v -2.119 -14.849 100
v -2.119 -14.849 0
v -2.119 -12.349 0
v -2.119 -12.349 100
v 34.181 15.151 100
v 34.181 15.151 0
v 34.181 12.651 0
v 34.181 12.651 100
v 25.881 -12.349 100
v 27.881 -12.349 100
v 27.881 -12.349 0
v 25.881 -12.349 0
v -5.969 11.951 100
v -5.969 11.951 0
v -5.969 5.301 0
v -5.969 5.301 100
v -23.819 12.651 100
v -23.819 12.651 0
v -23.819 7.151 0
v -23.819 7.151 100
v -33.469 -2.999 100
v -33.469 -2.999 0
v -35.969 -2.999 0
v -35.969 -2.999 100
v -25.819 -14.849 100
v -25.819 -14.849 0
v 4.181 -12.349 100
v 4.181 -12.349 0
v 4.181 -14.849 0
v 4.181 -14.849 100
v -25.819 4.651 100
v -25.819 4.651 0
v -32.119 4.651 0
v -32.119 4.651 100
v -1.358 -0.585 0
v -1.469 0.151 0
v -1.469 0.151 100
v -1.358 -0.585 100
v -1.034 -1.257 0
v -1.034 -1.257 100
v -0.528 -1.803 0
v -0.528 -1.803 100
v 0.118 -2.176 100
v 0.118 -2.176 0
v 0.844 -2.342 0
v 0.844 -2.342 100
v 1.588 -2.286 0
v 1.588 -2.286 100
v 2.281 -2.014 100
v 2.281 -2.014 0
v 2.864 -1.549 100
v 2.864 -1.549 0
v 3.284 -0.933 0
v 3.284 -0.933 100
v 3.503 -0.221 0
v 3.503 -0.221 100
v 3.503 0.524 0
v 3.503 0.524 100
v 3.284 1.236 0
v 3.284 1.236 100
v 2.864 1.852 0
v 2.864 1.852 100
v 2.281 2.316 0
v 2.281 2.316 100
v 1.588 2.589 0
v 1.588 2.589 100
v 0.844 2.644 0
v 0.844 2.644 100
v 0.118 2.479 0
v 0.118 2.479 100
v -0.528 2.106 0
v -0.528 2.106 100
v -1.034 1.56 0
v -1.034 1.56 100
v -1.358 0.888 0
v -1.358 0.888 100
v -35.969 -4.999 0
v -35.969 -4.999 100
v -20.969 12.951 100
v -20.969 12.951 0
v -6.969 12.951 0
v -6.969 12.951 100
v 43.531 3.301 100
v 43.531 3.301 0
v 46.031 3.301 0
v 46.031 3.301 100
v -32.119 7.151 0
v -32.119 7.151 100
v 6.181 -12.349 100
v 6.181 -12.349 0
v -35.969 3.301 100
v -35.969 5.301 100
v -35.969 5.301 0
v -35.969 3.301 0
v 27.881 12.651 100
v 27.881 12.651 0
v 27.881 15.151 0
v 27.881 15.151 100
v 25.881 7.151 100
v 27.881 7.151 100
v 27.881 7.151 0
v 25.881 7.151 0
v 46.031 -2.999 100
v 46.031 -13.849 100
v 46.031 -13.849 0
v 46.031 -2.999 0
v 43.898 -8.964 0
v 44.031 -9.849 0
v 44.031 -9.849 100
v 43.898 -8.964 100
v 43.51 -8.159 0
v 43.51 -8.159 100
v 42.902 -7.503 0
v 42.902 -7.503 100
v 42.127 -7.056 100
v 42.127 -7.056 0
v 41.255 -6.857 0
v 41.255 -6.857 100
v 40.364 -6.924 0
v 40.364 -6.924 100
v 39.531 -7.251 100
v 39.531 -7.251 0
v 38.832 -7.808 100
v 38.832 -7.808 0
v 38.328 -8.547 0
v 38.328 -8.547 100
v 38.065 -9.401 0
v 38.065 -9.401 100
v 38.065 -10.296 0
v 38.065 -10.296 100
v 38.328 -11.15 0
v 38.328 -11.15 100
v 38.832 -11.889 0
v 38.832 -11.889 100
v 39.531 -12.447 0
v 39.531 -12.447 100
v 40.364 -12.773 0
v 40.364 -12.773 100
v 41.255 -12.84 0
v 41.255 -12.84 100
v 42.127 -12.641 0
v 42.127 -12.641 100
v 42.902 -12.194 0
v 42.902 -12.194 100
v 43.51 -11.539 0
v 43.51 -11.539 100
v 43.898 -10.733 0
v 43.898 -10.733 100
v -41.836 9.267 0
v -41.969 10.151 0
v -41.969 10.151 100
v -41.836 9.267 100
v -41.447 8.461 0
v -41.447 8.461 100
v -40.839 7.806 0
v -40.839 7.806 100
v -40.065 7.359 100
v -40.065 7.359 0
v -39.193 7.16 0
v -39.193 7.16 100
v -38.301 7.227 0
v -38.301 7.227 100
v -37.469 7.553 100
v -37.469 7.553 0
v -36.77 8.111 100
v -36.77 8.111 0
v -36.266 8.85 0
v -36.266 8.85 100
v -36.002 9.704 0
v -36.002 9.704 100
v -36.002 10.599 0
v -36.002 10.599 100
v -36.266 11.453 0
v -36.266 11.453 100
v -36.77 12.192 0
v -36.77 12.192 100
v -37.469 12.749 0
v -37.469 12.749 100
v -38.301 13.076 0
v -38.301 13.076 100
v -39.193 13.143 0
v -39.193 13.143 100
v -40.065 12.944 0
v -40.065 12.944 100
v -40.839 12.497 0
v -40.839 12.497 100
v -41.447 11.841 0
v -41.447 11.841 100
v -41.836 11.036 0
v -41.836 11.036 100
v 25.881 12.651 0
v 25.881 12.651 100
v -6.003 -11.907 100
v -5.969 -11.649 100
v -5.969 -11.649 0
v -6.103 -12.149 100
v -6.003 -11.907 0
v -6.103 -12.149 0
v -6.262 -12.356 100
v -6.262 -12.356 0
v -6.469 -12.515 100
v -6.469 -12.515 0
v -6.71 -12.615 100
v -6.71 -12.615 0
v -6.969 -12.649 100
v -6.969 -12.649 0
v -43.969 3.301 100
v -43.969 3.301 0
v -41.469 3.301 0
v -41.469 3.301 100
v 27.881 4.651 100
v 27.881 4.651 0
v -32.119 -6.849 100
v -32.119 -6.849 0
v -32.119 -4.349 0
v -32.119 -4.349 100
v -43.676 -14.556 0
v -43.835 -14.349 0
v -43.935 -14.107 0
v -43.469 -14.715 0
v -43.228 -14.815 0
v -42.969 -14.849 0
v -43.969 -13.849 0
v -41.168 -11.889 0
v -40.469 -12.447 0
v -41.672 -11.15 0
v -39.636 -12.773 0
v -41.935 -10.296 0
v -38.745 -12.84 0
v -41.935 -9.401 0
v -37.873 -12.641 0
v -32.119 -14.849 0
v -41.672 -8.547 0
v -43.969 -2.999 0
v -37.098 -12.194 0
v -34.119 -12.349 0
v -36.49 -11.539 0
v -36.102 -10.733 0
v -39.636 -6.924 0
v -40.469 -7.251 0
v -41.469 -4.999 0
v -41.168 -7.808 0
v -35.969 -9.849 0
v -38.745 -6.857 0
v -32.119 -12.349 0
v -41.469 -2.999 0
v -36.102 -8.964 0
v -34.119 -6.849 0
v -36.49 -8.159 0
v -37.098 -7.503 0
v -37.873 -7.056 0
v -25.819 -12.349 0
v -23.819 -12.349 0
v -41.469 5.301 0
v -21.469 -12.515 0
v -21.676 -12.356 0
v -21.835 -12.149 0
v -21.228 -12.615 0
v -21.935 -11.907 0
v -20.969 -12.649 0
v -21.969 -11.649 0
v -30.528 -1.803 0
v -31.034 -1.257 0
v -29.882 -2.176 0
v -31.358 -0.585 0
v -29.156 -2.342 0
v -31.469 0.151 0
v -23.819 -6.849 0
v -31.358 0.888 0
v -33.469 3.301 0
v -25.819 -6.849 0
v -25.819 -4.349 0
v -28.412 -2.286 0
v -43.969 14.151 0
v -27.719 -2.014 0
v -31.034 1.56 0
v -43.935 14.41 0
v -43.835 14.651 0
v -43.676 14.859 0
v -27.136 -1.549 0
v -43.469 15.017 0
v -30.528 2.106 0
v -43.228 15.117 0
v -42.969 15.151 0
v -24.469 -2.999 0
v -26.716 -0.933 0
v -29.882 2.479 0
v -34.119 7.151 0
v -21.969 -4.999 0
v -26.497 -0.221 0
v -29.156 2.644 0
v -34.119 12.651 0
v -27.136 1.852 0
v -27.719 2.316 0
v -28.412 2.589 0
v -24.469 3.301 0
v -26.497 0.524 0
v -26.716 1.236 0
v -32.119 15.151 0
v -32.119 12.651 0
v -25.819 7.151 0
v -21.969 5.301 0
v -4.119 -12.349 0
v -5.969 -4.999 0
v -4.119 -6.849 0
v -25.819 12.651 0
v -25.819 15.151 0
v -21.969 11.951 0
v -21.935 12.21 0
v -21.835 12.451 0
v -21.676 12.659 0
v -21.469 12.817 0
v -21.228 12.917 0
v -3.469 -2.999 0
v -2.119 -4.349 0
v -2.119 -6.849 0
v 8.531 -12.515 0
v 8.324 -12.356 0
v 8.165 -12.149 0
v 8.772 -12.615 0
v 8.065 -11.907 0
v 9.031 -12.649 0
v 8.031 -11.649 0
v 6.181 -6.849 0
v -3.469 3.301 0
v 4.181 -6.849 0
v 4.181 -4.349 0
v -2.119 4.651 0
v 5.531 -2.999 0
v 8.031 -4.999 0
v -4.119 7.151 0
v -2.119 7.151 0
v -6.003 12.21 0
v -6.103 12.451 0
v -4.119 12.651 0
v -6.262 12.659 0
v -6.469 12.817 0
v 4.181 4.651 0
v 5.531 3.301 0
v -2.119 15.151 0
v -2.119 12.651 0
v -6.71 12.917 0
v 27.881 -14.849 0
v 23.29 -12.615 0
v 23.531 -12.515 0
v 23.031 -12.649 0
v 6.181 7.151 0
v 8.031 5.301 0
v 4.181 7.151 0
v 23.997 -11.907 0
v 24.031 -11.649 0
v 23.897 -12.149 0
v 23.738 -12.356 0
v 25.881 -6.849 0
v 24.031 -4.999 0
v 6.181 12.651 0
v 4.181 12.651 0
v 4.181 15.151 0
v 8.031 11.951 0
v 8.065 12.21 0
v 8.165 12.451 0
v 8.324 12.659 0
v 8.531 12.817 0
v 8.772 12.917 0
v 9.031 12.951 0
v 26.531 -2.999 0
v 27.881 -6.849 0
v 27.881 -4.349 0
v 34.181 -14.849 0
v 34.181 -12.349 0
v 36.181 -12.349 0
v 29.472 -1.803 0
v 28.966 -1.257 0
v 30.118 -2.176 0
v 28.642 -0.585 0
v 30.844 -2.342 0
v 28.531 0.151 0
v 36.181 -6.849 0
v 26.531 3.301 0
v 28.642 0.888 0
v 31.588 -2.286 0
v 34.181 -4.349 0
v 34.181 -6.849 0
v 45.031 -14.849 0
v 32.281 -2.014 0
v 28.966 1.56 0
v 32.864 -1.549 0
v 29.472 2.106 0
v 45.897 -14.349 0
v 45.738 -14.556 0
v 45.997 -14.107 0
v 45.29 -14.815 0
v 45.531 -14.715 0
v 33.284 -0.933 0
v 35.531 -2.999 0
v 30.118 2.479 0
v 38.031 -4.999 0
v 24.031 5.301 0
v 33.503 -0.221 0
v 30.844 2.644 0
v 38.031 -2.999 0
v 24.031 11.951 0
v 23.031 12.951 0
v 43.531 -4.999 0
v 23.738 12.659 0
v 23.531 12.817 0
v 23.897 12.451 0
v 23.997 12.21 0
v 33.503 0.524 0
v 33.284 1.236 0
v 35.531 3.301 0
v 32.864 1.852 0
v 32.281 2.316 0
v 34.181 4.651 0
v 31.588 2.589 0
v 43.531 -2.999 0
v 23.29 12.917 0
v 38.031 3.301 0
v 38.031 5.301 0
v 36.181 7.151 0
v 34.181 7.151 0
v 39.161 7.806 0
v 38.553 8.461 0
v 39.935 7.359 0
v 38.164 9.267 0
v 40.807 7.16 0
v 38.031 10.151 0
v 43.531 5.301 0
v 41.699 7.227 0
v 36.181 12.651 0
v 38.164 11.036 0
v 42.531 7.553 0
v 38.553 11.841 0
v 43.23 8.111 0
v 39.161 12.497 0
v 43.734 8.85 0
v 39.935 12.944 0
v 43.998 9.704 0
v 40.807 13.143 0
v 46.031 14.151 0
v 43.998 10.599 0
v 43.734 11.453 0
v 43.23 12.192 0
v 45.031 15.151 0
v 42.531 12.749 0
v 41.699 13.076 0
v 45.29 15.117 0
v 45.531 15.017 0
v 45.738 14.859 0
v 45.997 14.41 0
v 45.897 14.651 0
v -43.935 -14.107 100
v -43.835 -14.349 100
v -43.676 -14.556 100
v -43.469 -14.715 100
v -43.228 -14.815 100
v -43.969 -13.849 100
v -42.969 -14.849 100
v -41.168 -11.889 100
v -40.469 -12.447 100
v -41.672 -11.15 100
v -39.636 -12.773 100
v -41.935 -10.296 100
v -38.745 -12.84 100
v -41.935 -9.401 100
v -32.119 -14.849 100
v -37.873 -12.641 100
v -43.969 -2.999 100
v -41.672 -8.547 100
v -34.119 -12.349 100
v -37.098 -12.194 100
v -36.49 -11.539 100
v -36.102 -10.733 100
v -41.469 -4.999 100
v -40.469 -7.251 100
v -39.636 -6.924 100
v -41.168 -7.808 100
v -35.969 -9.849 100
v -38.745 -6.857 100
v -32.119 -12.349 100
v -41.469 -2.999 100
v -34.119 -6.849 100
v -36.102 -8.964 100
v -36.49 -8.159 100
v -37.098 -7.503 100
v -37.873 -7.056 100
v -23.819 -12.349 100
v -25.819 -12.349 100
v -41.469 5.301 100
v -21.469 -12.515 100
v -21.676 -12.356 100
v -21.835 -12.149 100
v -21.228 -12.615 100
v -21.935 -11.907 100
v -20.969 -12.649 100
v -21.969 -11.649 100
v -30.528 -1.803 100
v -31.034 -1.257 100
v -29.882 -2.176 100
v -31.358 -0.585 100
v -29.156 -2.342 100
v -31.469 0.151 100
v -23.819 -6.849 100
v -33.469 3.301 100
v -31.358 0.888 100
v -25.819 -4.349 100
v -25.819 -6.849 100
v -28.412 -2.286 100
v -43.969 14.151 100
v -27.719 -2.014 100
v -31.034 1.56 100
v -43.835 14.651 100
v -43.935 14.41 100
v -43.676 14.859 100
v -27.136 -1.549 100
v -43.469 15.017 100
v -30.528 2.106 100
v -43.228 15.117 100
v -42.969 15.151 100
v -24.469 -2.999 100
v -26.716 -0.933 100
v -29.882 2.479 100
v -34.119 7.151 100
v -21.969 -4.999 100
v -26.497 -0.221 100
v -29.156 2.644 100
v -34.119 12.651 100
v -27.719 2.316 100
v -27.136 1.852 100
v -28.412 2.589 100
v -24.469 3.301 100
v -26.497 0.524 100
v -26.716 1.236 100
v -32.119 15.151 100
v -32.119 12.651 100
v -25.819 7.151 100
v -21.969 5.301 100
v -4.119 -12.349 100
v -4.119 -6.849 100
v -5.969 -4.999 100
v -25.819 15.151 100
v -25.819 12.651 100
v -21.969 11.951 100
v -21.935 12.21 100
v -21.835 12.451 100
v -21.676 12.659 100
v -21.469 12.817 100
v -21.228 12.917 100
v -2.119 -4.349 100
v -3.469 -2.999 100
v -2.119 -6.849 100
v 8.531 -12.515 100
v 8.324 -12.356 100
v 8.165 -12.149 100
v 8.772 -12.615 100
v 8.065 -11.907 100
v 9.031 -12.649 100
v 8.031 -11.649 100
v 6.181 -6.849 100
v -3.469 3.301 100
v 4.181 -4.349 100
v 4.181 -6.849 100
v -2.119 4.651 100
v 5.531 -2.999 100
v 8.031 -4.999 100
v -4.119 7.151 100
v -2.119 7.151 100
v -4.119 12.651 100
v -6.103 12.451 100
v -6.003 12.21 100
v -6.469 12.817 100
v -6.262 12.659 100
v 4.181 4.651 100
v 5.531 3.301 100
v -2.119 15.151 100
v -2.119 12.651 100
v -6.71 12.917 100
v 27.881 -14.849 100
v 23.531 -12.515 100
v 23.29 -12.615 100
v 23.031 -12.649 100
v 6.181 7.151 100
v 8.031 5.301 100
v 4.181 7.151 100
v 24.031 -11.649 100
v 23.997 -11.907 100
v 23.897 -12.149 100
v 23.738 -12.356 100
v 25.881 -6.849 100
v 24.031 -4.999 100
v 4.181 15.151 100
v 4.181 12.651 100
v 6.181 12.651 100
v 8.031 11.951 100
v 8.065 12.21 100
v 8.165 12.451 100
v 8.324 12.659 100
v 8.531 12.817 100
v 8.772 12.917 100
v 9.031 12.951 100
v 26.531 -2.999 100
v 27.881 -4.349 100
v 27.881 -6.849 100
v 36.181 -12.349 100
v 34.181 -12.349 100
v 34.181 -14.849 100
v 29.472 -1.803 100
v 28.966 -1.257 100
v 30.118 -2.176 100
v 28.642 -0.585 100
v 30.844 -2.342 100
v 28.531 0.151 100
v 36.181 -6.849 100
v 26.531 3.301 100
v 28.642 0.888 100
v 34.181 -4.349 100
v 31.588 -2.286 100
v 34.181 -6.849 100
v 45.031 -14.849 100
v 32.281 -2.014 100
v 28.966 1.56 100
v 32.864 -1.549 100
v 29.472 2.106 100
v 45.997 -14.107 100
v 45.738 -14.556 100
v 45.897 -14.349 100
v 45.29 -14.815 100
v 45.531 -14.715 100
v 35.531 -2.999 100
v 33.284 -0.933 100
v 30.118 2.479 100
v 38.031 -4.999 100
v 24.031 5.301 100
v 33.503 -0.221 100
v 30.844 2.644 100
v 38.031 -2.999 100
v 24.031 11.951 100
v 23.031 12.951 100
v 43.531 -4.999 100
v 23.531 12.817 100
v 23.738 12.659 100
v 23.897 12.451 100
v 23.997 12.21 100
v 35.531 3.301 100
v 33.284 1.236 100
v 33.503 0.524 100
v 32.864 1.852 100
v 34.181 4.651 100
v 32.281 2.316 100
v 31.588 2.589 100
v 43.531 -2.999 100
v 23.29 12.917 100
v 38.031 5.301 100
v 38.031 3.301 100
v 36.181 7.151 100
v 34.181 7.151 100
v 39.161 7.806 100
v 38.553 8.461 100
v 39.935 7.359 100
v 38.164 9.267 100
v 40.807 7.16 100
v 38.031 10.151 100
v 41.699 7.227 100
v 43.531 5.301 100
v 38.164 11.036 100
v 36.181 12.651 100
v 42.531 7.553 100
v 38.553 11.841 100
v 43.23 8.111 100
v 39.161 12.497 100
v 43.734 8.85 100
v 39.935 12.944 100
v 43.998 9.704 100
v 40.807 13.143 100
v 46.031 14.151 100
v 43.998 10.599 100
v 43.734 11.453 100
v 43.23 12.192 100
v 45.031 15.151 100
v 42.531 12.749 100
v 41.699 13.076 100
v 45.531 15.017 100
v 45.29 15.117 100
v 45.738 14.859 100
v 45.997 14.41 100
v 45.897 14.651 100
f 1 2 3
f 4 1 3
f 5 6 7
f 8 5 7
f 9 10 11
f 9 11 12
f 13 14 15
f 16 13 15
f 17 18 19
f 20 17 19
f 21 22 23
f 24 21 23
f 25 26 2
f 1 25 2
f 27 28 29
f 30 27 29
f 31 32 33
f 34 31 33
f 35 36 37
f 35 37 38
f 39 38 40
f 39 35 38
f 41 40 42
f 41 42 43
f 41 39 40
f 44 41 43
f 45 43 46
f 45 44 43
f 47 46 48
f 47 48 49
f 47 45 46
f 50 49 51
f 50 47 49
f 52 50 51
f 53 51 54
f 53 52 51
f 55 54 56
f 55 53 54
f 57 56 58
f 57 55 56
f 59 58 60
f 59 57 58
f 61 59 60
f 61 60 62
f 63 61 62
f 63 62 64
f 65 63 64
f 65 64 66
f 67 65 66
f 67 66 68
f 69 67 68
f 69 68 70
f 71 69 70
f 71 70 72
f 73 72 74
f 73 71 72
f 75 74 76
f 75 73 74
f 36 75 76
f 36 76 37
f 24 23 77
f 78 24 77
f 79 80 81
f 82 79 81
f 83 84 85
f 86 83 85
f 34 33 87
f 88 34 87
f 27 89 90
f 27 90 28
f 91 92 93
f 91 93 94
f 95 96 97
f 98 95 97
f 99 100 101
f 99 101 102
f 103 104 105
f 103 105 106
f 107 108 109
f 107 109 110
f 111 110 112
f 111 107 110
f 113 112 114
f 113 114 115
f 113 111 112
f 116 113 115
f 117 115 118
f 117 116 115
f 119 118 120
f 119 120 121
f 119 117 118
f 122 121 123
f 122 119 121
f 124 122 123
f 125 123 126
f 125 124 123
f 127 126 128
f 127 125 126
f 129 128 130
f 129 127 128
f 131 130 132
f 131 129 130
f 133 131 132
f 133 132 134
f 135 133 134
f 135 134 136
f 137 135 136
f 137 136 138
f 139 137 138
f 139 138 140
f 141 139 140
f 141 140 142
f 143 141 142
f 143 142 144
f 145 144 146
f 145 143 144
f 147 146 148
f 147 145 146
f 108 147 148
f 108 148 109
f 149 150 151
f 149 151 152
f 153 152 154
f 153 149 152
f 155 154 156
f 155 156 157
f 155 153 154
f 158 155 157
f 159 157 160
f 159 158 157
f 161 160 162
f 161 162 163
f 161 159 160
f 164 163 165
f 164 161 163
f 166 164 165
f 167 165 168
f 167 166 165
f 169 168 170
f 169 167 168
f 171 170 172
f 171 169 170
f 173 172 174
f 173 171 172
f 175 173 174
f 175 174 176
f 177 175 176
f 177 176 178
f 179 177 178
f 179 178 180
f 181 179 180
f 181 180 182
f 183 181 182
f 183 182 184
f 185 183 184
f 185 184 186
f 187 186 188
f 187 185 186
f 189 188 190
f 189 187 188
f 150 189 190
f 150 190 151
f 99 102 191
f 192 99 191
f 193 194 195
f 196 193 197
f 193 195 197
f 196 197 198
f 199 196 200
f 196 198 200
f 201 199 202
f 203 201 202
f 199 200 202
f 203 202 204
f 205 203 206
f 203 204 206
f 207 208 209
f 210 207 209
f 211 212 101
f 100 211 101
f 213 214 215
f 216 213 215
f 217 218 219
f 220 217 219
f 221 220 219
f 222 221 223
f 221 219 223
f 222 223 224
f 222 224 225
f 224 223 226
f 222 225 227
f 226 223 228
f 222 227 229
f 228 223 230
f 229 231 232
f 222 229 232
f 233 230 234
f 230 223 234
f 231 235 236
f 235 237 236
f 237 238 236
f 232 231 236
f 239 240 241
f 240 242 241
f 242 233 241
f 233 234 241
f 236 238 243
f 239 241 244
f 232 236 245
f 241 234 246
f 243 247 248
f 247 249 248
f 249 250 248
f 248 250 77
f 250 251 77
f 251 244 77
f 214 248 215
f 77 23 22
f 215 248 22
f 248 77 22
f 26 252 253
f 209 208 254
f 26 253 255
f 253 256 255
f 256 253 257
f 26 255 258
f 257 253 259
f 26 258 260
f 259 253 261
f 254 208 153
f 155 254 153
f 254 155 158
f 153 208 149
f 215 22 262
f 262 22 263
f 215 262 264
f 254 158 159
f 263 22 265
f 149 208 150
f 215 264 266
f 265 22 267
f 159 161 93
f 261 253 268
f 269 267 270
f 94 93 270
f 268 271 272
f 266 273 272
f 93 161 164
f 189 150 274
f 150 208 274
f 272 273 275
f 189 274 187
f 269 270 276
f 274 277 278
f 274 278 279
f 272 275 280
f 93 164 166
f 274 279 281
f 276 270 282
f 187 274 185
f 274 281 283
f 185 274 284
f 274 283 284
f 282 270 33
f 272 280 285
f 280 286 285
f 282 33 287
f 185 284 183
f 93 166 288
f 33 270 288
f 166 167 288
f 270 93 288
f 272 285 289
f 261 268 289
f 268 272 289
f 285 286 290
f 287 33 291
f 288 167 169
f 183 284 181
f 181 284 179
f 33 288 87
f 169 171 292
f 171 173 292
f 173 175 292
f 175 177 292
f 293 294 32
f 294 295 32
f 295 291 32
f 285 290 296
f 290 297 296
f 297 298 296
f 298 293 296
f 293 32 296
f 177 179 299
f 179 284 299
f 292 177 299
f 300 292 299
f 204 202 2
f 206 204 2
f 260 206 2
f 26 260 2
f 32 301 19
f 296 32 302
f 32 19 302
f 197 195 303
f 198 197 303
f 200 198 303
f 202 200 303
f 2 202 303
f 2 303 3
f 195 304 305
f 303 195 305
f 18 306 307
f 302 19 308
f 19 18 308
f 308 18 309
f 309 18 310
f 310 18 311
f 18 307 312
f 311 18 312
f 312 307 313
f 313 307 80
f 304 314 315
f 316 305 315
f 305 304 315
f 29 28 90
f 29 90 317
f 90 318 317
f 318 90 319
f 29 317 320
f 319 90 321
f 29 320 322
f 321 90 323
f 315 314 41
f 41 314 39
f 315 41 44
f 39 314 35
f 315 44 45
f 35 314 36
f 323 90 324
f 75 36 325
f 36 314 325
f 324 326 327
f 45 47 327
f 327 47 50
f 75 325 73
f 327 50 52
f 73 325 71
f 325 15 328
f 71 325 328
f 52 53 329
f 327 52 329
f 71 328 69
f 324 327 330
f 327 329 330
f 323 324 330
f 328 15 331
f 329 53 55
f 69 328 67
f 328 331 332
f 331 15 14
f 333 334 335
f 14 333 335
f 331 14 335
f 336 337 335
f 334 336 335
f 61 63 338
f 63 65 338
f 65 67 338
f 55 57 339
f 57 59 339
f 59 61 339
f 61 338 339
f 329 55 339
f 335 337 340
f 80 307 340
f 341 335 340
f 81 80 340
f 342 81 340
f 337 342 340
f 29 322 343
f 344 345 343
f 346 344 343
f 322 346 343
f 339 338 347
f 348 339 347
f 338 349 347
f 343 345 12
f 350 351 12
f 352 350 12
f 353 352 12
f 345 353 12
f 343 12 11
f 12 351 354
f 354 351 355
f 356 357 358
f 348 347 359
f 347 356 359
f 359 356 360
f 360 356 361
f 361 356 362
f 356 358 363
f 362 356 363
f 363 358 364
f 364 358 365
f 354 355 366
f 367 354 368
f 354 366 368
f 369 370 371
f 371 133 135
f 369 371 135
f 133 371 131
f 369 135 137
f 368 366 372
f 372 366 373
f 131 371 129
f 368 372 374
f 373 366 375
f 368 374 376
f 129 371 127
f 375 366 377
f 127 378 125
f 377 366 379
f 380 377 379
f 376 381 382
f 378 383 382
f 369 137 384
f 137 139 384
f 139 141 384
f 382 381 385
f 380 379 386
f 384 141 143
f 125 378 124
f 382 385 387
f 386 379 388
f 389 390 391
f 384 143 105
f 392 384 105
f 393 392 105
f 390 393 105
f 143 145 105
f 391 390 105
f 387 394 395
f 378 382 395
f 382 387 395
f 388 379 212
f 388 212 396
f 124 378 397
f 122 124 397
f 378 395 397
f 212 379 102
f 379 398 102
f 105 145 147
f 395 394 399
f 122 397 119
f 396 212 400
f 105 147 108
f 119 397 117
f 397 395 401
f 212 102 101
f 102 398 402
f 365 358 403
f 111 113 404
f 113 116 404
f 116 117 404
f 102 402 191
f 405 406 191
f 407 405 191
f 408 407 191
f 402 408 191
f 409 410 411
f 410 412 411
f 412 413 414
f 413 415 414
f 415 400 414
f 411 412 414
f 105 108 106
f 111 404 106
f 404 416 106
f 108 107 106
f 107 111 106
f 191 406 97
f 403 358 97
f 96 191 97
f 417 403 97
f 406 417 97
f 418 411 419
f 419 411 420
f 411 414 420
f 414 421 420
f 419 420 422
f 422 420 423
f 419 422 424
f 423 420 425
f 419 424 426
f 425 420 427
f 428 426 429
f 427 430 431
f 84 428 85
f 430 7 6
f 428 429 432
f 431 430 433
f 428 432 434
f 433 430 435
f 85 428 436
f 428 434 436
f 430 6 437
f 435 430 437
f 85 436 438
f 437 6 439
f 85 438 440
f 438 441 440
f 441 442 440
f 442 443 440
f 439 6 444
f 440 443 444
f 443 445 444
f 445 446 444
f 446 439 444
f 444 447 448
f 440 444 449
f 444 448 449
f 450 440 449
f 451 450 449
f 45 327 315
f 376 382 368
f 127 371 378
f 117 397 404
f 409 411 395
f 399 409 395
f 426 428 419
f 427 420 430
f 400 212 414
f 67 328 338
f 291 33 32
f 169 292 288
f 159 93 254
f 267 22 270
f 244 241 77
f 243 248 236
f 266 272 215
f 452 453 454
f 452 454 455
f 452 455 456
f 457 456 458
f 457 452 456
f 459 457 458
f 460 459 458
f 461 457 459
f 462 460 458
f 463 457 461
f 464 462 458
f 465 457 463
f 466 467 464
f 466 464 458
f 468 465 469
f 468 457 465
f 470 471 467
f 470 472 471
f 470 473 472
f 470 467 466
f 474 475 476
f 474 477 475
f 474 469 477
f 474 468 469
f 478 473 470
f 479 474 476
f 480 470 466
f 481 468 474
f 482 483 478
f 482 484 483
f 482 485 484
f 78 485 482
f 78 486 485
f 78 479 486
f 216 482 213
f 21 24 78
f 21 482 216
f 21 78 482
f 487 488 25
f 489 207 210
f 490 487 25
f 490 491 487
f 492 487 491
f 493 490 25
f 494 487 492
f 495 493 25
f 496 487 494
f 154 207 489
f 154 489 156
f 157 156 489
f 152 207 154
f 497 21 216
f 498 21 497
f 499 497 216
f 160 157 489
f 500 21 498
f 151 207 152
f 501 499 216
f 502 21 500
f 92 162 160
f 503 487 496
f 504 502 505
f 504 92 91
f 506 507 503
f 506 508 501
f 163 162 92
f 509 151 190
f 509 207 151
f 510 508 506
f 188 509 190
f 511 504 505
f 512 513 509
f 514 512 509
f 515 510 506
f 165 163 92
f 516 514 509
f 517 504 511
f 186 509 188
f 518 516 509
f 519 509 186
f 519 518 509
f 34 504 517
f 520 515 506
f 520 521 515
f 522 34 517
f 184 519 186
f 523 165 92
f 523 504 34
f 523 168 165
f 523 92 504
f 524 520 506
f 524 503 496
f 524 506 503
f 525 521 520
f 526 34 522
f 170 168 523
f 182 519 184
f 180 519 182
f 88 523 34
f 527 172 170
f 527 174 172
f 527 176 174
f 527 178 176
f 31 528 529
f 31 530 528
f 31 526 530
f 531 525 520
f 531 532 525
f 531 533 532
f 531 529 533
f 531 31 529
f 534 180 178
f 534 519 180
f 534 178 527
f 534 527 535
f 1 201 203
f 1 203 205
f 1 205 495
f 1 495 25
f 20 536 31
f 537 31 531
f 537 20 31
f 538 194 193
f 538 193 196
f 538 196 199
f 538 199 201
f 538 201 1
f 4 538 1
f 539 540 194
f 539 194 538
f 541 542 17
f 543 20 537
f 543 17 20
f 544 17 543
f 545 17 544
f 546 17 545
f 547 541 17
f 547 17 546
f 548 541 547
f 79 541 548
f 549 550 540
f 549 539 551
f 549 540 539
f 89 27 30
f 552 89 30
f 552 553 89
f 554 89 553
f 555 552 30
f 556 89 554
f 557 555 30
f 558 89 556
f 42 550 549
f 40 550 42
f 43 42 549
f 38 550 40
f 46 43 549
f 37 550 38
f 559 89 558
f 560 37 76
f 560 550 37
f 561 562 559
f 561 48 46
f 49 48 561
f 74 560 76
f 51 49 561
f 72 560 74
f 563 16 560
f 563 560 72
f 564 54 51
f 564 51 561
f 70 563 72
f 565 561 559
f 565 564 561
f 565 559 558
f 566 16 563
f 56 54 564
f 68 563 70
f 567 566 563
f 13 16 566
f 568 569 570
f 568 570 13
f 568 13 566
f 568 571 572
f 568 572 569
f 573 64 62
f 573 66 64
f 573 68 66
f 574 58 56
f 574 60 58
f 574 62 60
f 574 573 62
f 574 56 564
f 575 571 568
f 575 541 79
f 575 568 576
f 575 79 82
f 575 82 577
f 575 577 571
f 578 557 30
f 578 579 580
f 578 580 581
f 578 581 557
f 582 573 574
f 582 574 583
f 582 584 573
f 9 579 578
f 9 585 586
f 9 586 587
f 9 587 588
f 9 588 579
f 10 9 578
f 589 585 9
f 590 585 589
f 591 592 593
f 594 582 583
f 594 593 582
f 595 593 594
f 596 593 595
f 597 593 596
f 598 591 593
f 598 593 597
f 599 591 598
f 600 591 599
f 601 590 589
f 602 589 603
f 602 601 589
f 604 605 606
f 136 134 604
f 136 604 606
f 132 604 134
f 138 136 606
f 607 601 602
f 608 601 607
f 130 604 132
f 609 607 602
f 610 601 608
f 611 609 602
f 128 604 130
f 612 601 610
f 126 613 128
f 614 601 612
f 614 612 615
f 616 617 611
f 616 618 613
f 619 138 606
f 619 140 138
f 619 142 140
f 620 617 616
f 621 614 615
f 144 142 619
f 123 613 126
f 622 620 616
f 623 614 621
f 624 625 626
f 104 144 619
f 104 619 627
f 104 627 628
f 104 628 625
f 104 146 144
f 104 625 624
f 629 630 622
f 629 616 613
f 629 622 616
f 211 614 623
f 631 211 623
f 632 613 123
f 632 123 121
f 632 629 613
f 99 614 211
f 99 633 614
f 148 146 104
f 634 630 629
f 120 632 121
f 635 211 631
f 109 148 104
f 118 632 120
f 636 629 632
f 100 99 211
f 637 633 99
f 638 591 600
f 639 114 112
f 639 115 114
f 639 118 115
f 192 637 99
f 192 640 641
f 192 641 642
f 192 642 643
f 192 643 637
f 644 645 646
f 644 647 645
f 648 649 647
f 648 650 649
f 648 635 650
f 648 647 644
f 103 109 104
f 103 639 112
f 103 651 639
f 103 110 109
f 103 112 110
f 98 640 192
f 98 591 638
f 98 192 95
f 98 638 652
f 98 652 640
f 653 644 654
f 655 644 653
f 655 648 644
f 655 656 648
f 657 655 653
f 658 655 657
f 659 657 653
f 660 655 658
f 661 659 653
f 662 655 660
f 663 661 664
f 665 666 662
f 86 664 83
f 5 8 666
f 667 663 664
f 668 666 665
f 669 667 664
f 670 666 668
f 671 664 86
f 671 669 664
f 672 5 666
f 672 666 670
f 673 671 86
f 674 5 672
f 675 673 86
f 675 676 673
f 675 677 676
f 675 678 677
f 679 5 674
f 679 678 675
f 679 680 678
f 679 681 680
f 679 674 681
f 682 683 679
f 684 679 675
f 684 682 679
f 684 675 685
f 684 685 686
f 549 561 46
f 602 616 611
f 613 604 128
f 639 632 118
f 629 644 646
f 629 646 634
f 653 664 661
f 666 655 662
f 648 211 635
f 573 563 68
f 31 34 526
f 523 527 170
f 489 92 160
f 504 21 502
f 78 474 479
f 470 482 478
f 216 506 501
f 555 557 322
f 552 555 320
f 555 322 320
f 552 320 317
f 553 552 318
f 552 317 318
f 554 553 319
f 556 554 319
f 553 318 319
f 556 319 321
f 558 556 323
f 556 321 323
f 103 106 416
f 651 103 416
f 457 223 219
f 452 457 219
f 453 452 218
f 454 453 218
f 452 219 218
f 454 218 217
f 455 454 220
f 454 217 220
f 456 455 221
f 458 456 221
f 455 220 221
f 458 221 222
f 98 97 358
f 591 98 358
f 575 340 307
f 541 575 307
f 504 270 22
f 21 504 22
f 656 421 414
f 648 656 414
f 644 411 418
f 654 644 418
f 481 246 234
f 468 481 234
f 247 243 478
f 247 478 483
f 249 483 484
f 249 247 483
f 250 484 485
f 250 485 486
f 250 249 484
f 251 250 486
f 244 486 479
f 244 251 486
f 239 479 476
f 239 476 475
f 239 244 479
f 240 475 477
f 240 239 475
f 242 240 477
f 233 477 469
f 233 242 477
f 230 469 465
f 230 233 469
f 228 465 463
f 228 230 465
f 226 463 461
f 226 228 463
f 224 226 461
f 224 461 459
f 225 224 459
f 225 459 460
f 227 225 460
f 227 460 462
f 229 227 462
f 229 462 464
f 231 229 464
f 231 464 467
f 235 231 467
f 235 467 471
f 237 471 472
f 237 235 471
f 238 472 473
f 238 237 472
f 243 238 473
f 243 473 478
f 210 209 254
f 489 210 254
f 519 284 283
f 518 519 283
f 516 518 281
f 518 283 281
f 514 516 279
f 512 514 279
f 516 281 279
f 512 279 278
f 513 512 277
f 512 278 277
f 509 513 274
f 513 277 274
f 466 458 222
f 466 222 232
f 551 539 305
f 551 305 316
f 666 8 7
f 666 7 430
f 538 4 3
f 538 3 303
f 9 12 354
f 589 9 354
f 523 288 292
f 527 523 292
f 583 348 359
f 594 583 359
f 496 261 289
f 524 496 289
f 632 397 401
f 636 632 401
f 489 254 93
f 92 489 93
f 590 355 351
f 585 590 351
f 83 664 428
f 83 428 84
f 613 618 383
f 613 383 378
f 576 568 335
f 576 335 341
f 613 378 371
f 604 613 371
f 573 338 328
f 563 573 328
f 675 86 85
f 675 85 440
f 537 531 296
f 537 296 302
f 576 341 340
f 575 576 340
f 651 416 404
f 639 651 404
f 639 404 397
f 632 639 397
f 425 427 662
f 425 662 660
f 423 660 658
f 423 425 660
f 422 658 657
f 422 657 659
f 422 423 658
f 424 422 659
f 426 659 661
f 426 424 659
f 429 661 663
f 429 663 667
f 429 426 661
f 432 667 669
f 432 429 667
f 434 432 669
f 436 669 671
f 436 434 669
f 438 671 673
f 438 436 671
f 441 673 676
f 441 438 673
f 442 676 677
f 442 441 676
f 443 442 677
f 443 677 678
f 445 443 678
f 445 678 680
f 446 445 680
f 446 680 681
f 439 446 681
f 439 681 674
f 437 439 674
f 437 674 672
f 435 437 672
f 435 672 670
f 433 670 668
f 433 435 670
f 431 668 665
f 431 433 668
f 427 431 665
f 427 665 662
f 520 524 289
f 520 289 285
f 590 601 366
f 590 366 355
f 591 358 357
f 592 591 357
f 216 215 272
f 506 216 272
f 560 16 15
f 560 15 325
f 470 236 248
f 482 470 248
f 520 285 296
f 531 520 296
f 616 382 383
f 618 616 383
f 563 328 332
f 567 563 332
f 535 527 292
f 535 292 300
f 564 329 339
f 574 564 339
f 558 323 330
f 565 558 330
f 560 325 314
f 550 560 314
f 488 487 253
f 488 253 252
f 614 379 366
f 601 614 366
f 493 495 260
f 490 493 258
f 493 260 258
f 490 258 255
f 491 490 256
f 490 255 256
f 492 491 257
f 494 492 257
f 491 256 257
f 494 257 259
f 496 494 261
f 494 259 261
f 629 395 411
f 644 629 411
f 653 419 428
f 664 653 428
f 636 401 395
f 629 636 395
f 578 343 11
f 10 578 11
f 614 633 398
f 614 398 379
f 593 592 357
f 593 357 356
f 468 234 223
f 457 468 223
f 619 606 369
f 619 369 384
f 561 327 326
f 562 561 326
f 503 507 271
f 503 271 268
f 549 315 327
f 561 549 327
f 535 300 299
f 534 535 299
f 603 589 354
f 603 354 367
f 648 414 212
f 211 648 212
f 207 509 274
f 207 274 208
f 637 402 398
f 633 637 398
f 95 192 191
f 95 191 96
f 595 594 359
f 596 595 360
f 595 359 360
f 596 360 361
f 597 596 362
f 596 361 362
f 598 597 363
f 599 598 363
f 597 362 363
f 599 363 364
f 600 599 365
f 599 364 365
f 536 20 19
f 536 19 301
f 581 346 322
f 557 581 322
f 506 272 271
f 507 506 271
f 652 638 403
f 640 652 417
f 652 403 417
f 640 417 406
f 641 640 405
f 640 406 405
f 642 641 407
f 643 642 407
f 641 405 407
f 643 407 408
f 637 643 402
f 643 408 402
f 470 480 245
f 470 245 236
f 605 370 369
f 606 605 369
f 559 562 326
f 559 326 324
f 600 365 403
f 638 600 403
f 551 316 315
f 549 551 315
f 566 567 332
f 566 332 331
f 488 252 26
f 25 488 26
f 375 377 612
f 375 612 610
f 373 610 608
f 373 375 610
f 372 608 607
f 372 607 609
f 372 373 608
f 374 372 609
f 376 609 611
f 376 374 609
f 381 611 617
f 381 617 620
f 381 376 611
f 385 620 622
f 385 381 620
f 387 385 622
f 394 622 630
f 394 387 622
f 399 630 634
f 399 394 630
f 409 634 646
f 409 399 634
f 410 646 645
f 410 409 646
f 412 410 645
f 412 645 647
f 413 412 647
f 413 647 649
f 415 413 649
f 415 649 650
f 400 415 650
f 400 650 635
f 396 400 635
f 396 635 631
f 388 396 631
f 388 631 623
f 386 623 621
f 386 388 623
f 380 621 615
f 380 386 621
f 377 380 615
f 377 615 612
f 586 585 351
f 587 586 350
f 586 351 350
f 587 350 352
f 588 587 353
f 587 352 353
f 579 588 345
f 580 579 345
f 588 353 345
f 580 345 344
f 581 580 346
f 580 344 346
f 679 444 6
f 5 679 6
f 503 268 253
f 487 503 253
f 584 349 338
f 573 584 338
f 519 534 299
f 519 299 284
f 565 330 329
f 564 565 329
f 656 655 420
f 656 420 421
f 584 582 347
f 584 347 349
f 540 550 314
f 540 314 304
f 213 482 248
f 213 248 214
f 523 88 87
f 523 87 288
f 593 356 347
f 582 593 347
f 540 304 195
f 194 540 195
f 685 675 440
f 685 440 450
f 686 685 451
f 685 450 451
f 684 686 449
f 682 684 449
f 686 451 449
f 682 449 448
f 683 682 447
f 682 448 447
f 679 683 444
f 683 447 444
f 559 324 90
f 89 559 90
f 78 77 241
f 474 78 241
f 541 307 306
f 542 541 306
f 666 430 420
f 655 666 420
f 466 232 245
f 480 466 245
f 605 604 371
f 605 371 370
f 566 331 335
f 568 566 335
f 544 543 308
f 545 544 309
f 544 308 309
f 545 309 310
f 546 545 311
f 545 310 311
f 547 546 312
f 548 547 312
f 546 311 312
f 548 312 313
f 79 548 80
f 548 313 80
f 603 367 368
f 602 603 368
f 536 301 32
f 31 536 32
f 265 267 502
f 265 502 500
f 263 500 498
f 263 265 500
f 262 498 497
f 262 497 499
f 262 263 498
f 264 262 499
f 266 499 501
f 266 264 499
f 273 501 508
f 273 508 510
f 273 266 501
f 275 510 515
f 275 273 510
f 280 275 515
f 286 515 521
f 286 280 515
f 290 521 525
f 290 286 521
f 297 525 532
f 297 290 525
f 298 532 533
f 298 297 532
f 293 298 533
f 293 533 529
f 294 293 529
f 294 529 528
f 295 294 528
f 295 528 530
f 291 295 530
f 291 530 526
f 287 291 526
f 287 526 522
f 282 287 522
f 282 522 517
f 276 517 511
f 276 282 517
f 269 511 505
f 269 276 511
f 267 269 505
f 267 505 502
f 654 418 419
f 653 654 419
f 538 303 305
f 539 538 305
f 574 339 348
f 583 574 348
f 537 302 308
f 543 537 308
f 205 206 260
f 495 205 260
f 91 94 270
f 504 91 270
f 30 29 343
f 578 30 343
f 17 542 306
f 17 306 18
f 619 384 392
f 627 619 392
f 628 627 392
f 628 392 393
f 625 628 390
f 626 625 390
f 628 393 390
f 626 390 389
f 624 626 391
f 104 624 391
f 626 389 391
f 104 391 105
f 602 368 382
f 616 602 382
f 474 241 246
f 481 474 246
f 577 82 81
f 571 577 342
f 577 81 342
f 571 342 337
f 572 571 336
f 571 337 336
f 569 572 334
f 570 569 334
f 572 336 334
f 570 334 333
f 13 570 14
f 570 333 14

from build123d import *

# Parameters (mm, degrees)
EXTRUDE_1_DEPTH = 100


with BuildPart() as part:
    # 草图1 → 凸台-拉伸1 (new body)
    with BuildSketch(Plane.XY):
        with BuildLine():
            Line((-25.818782805, -14.848597483), (-14.968782805, -14.848597483))
            Line((-14.968782805, -14.848597483), (-2.118782805, -14.848597483))
            Line((-2.118782805, -14.848597483), (-2.118782805, -12.348597483))
            Line((-2.118782805, -12.348597483), (-4.118782805, -12.348597483))
            Line((-4.118782805, -12.348597483), (-4.118782805, -6.848597483))
            Line((-4.118782805, -6.848597483), (-2.118782805, -6.848597483))
            Line((-2.118782805, -6.848597483), (-2.118782805, -4.348597483))
            Line((-2.118782805, -4.348597483), (1.031217195, -4.348597483))
            Line((1.031217195, -4.348597483), (4.181217195, -4.348597483))
            Line((4.181217195, -4.348597483), (4.181217195, -6.848597483))
            Line((4.181217195, -6.848597483), (6.181217195, -6.848597483))
            Line((6.181217195, -6.848597483), (6.181217195, -12.348597483))
            Line((6.181217195, -12.348597483), (4.181217195, -12.348597483))
            Line((4.181217195, -12.348597483), (4.181217195, -14.848597483))
            Line((4.181217195, -14.848597483), (17.031217195, -14.848597483))
            Line((17.031217195, -14.848597483), (27.881217195, -14.848597483))
            Line((27.881217195, -14.848597483), (27.881217195, -12.348597483))
            Line((27.881217195, -12.348597483), (25.881217195, -12.348597483))
            Line((25.881217195, -12.348597483), (25.881217195, -6.848597483))
            Line((25.881217195, -6.848597483), (27.881217195, -6.848597483))
            Line((27.881217195, -6.848597483), (27.881217195, -4.348597483))
            Line((27.881217195, -4.348597483), (31.031217195, -4.348597483))
            Line((31.031217195, -4.348597483), (34.181217195, -4.348597483))
            Line((34.181217195, -4.348597483), (34.181217195, -6.848597483))
            Line((34.181217195, -6.848597483), (36.181217195, -6.848597483))
            Line((36.181217195, -6.848597483), (36.181217195, -12.348597483))
            Line((36.181217195, -12.348597483), (34.181217195, -12.348597483))
            Line((34.181217195, -12.348597483), (34.181217195, -14.848597483))
            Line((34.181217195, -14.848597483), (45.031217195, -14.848597483))
            ThreePointArc((45.031217195, -14.848597483), (45.738323976, -14.555704264), (46.031217195, -13.848597483))
            Line((46.031217195, -13.848597483), (46.031217195, -2.998597483))
            Line((46.031217195, -2.998597483), (43.531217195, -2.998597483))
            Line((43.531217195, -2.998597483), (43.531217195, -4.998597483))
            Line((43.531217195, -4.998597483), (38.031217195, -4.998597483))
            Line((38.031217195, -4.998597483), (38.031217195, -2.998597483))
            Line((38.031217195, -2.998597483), (35.531217195, -2.998597483))
            Line((35.531217195, -2.998597483), (35.531217195, 0.151402517))
            Line((35.531217195, 0.151402517), (35.531217195, 3.301402517))
            Line((35.531217195, 3.301402517), (38.031217195, 3.301402517))
            Line((38.031217195, 3.301402517), (38.031217195, 5.301402517))
            Line((38.031217195, 5.301402517), (43.531217195, 5.301402517))
            Line((43.531217195, 5.301402517), (43.531217195, 3.301402517))
            Line((43.531217195, 3.301402517), (46.031217195, 3.301402517))
            Line((46.031217195, 3.301402517), (46.031217195, 14.151402517))
            ThreePointArc((46.031217195, 14.151402517), (45.738323976, 14.858509298), (45.031217195, 15.151402517))
            Line((45.031217195, 15.151402517), (34.181217195, 15.151402517))
            Line((34.181217195, 15.151402517), (34.181217195, 12.651402517))
            Line((34.181217195, 12.651402517), (36.181217195, 12.651402517))
            Line((36.181217195, 12.651402517), (36.181217195, 7.151402517))
            Line((36.181217195, 7.151402517), (34.181217195, 7.151402517))
            Line((34.181217195, 7.151402517), (34.181217195, 4.651402517))
            Line((34.181217195, 4.651402517), (31.031217195, 4.651402517))
            Line((31.031217195, 4.651402517), (27.881217195, 4.651402517))
            Line((27.881217195, 4.651402517), (27.881217195, 7.151402517))
            Line((27.881217195, 7.151402517), (25.881217195, 7.151402517))
            Line((25.881217195, 7.151402517), (25.881217195, 12.651402517))
            Line((25.881217195, 12.651402517), (27.881217195, 12.651402517))
            Line((27.881217195, 12.651402517), (27.881217195, 15.151402517))
            Line((27.881217195, 15.151402517), (4.181217195, 15.151402517))
            Line((4.181217195, 15.151402517), (4.181217195, 12.651402517))
            Line((4.181217195, 12.651402517), (6.181217195, 12.651402517))
            Line((6.181217195, 12.651402517), (6.181217195, 7.151402517))
            Line((6.181217195, 7.151402517), (4.181217195, 7.151402517))
            Line((4.181217195, 7.151402517), (4.181217195, 4.651402517))
            Line((4.181217195, 4.651402517), (1.031217195, 4.651402517))
            Line((1.031217195, 4.651402517), (-2.118782805, 4.651402517))
            Line((-2.118782805, 4.651402517), (-2.118782805, 7.151402517))
            Line((-2.118782805, 7.151402517), (-4.118782805, 7.151402517))
            Line((-4.118782805, 7.151402517), (-4.118782805, 12.651402517))
            Line((-4.118782805, 12.651402517), (-2.118782805, 12.651402517))
            Line((-2.118782805, 12.651402517), (-2.118782805, 15.151402517))
            Line((-2.118782805, 15.151402517), (-25.818782805, 15.151402517))
            Line((-25.818782805, 15.151402517), (-25.818782805, 12.651402517))
            Line((-25.818782805, 12.651402517), (-23.818782805, 12.651402517))
            Line((-23.818782805, 12.651402517), (-23.818782805, 7.151402517))
            Line((-23.818782805, 7.151402517), (-25.818782805, 7.151402517))
            Line((-25.818782805, 7.151402517), (-25.818782805, 4.651402517))
            Line((-25.818782805, 4.651402517), (-28.968782805, 4.651402517))
            Line((-28.968782805, 4.651402517), (-32.118782805, 4.651402517))
            Line((-32.118782805, 4.651402517), (-32.118782805, 7.151402517))
            Line((-32.118782805, 7.151402517), (-34.118782805, 7.151402517))
            Line((-34.118782805, 7.151402517), (-34.118782805, 12.651402517))
            Line((-34.118782805, 12.651402517), (-32.118782805, 12.651402517))
            Line((-32.118782805, 12.651402517), (-32.118782805, 15.151402517))
            Line((-32.118782805, 15.151402517), (-42.968782805, 15.151402517))
            ThreePointArc((-42.968782805, 15.151402517), (-43.675889586, 14.858509298), (-43.968782805, 14.151402517))
            Line((-43.968782805, 14.151402517), (-43.968782805, 3.301402517))
            Line((-43.968782805, 3.301402517), (-41.468782805, 3.301402517))
            Line((-41.468782805, 3.301402517), (-41.468782805, 5.301402517))
            Line((-41.468782805, 5.301402517), (-35.968782805, 5.301402517))
            Line((-35.968782805, 5.301402517), (-35.968782805, 3.301402517))
            Line((-35.968782805, 3.301402517), (-33.468782805, 3.301402517))
            Line((-33.468782805, 3.301402517), (-33.468782805, 0.151402517))
            Line((-33.468782805, 0.151402517), (-33.468782805, -2.998597483))
            Line((-33.468782805, -2.998597483), (-35.968782805, -2.998597483))
            Line((-35.968782805, -2.998597483), (-35.968782805, -4.998597483))
            Line((-35.968782805, -4.998597483), (-41.468782805, -4.998597483))
            Line((-41.468782805, -4.998597483), (-41.468782805, -2.998597483))
            Line((-41.468782805, -2.998597483), (-43.968782805, -2.998597483))
            Line((-43.968782805, -2.998597483), (-43.968782805, -13.848597483))
            ThreePointArc((-43.968782805, -13.848597483), (-43.675889586, -14.555704264), (-42.968782805, -14.848597483))
            Line((-42.968782805, -14.848597483), (-32.118782805, -14.848597483))
            Line((-32.118782805, -14.848597483), (-32.118782805, -12.348597483))
            Line((-32.118782805, -12.348597483), (-34.118782805, -12.348597483))
            Line((-34.118782805, -12.348597483), (-34.118782805, -6.848597483))
            Line((-34.118782805, -6.848597483), (-32.118782805, -6.848597483))
            Line((-32.118782805, -6.848597483), (-32.118782805, -4.348597483))
            Line((-32.118782805, -4.348597483), (-28.968782805, -4.348597483))
            Line((-28.968782805, -4.348597483), (-25.818782805, -4.348597483))
            Line((-25.818782805, -4.348597483), (-25.818782805, -6.848597483))
            Line((-25.818782805, -6.848597483), (-23.818782805, -6.848597483))
            Line((-23.818782805, -6.848597483), (-23.818782805, -12.348597483))
            Line((-23.818782805, -12.348597483), (-25.818782805, -12.348597483))
            Line((-25.818782805, -12.348597483), (-25.818782805, -14.848597483))
        make_face()
        with BuildLine():
            Line((-24.468782805, 0.151402517), (-24.468782805, 3.301402517))
            Line((-24.468782805, 3.301402517), (-21.968782805, 5.301402517))
            Line((-21.968782805, 5.301402517), (-21.968782805, 11.951402523))
            ThreePointArc((-21.968782805, 11.951402523), (-21.675889587, 12.658509303), (-20.968782806, 12.951402523))
            Line((-20.968782806, 12.951402523), (-13.968782805, 12.951402523))
            Line((-13.968782805, 12.951402523), (-6.968782804, 12.951402523))
            ThreePointArc((-6.968782804, 12.951402523), (-6.261676023, 12.658509303), (-5.968782805, 11.951402523))
            Line((-5.968782805, 11.951402523), (-5.968782805, 5.301402517))
            Line((-5.968782805, 5.301402517), (-3.468782805, 3.301402517))
            Line((-3.468782805, 3.301402517), (-3.468782805, 0.151402517))
            Line((-3.468782805, 0.151402517), (-3.468782805, -2.998597483))
            Line((-3.468782805, -2.998597483), (-5.968782805, -4.998597483))
            Line((-5.968782805, -4.998597483), (-5.968782805, -11.648597489))
            ThreePointArc((-5.968782805, -11.648597489), (-6.261676023, -12.355704269), (-6.968782804, -12.648597489))
            Line((-6.968782804, -12.648597489), (-13.968782805, -12.648597489))
            Line((-13.968782805, -12.648597489), (-20.968782806, -12.648597489))
            ThreePointArc((-20.968782806, -12.648597489), (-21.675889587, -12.355704269), (-21.968782805, -11.648597489))
            Line((-21.968782805, -11.648597489), (-21.968782805, -4.998597483))
            Line((-21.968782805, -4.998597483), (-24.468782805, -2.998597483))
            Line((-24.468782805, -2.998597483), (-24.468782805, 0.151402517))
        make_face(mode=Mode.SUBTRACT)
        with BuildLine():
            Line((5.531217195, -2.998597468), (5.531217195, 0.151402532))
            Line((5.531217195, 0.151402532), (5.531217195, 3.301402532))
            Line((5.531217195, 3.301402532), (8.031217195, 5.301402517))
            Line((8.031217195, 5.301402517), (8.031217195, 11.951402523))
            ThreePointArc((8.031217195, 11.951402523), (8.324110413, 12.658509303), (9.031217194, 12.951402523))
            Line((9.031217194, 12.951402523), (16.031217195, 12.951402523))
            Line((16.031217195, 12.951402523), (23.031217196, 12.951402523))
            ThreePointArc((23.031217196, 12.951402523), (23.738323977, 12.658509303), (24.031217195, 11.951402523))
            Line((24.031217195, 11.951402523), (24.031217195, 5.301402517))
            Line((24.031217195, 5.301402517), (26.531217195, 3.301402517))
            Line((26.531217195, 3.301402517), (26.531217195, 0.151402517))
            Line((26.531217195, 0.151402517), (26.531217195, -2.998597483))
            Line((26.531217195, -2.998597483), (24.031217195, -4.998597483))
            Line((24.031217195, -4.998597483), (24.031217195, -11.648597489))
            ThreePointArc((24.031217195, -11.648597489), (23.738323977, -12.355704269), (23.031217196, -12.648597489))
            Line((23.031217196, -12.648597489), (16.031217195, -12.648597489))
            Line((16.031217195, -12.648597489), (9.031217194, -12.648597489))
            ThreePointArc((9.031217194, -12.648597489), (8.324110413, -12.355704269), (8.031217195, -11.648597489))
            Line((8.031217195, -11.648597489), (8.031217195, -4.998597483))
            Line((8.031217195, -4.998597483), (5.531217195, -2.998597468))
        make_face(mode=Mode.SUBTRACT)
        with BuildLine():
            ThreePointArc((-35.968782805, 10.151402517), (-38.968782805, 13.151402517), (-41.968782805, 10.151402517))
            ThreePointArc((-41.968782805, 10.151402517), (-38.968782805, 7.151402517), (-35.968782805, 10.151402517))
        make_face(mode=Mode.SUBTRACT)
        with BuildLine():
            ThreePointArc((-41.968782805, -9.848597483), (-38.968782805, -12.848597483), (-35.968782805, -9.848597483))
            ThreePointArc((-35.968782805, -9.848597483), (-38.968782805, -6.848597483), (-41.968782805, -9.848597483))
        make_face(mode=Mode.SUBTRACT)
        with BuildLine():
            ThreePointArc((-26.468782805, 0.151402517), (-28.968782805, 2.651402517), (-31.468782805, 0.151402517))
            ThreePointArc((-31.468782805, 0.151402517), (-28.968782805, -2.348597483), (-26.468782805, 0.151402517))
        make_face(mode=Mode.SUBTRACT)
        with BuildLine():
            ThreePointArc((3.531217195, 0.151402532), (1.031217195, 2.651402532), (-1.468782805, 0.151402532))
            ThreePointArc((-1.468782805, 0.151402532), (1.031217195, -2.348597468), (3.531217195, 0.151402532))
        make_face(mode=Mode.SUBTRACT)
        with BuildLine():
            ThreePointArc((44.031217195, 10.151402517), (41.031217195, 13.151402517), (38.031217195, 10.151402517))
            ThreePointArc((38.031217195, 10.151402517), (41.031217195, 7.151402517), (44.031217195, 10.151402517))
        make_face(mode=Mode.SUBTRACT)
        with BuildLine():
            ThreePointArc((38.031217195, -9.848597483), (41.031217195, -12.848597483), (44.031217195, -9.848597483))
            ThreePointArc((44.031217195, -9.848597483), (41.031217195, -6.848597483), (38.031217195, -9.848597483))
        make_face(mode=Mode.SUBTRACT)
        with BuildLine():
            ThreePointArc((33.531217195, 0.151402517), (31.031217195, 2.651402517), (28.531217195, 0.151402517))
            ThreePointArc((28.531217195, 0.151402517), (31.031217195, -2.348597483), (33.531217195, 0.151402517))
        make_face(mode=Mode.SUBTRACT)
    extrude(amount=EXTRUDE_1_DEPTH)


solid = part.part
